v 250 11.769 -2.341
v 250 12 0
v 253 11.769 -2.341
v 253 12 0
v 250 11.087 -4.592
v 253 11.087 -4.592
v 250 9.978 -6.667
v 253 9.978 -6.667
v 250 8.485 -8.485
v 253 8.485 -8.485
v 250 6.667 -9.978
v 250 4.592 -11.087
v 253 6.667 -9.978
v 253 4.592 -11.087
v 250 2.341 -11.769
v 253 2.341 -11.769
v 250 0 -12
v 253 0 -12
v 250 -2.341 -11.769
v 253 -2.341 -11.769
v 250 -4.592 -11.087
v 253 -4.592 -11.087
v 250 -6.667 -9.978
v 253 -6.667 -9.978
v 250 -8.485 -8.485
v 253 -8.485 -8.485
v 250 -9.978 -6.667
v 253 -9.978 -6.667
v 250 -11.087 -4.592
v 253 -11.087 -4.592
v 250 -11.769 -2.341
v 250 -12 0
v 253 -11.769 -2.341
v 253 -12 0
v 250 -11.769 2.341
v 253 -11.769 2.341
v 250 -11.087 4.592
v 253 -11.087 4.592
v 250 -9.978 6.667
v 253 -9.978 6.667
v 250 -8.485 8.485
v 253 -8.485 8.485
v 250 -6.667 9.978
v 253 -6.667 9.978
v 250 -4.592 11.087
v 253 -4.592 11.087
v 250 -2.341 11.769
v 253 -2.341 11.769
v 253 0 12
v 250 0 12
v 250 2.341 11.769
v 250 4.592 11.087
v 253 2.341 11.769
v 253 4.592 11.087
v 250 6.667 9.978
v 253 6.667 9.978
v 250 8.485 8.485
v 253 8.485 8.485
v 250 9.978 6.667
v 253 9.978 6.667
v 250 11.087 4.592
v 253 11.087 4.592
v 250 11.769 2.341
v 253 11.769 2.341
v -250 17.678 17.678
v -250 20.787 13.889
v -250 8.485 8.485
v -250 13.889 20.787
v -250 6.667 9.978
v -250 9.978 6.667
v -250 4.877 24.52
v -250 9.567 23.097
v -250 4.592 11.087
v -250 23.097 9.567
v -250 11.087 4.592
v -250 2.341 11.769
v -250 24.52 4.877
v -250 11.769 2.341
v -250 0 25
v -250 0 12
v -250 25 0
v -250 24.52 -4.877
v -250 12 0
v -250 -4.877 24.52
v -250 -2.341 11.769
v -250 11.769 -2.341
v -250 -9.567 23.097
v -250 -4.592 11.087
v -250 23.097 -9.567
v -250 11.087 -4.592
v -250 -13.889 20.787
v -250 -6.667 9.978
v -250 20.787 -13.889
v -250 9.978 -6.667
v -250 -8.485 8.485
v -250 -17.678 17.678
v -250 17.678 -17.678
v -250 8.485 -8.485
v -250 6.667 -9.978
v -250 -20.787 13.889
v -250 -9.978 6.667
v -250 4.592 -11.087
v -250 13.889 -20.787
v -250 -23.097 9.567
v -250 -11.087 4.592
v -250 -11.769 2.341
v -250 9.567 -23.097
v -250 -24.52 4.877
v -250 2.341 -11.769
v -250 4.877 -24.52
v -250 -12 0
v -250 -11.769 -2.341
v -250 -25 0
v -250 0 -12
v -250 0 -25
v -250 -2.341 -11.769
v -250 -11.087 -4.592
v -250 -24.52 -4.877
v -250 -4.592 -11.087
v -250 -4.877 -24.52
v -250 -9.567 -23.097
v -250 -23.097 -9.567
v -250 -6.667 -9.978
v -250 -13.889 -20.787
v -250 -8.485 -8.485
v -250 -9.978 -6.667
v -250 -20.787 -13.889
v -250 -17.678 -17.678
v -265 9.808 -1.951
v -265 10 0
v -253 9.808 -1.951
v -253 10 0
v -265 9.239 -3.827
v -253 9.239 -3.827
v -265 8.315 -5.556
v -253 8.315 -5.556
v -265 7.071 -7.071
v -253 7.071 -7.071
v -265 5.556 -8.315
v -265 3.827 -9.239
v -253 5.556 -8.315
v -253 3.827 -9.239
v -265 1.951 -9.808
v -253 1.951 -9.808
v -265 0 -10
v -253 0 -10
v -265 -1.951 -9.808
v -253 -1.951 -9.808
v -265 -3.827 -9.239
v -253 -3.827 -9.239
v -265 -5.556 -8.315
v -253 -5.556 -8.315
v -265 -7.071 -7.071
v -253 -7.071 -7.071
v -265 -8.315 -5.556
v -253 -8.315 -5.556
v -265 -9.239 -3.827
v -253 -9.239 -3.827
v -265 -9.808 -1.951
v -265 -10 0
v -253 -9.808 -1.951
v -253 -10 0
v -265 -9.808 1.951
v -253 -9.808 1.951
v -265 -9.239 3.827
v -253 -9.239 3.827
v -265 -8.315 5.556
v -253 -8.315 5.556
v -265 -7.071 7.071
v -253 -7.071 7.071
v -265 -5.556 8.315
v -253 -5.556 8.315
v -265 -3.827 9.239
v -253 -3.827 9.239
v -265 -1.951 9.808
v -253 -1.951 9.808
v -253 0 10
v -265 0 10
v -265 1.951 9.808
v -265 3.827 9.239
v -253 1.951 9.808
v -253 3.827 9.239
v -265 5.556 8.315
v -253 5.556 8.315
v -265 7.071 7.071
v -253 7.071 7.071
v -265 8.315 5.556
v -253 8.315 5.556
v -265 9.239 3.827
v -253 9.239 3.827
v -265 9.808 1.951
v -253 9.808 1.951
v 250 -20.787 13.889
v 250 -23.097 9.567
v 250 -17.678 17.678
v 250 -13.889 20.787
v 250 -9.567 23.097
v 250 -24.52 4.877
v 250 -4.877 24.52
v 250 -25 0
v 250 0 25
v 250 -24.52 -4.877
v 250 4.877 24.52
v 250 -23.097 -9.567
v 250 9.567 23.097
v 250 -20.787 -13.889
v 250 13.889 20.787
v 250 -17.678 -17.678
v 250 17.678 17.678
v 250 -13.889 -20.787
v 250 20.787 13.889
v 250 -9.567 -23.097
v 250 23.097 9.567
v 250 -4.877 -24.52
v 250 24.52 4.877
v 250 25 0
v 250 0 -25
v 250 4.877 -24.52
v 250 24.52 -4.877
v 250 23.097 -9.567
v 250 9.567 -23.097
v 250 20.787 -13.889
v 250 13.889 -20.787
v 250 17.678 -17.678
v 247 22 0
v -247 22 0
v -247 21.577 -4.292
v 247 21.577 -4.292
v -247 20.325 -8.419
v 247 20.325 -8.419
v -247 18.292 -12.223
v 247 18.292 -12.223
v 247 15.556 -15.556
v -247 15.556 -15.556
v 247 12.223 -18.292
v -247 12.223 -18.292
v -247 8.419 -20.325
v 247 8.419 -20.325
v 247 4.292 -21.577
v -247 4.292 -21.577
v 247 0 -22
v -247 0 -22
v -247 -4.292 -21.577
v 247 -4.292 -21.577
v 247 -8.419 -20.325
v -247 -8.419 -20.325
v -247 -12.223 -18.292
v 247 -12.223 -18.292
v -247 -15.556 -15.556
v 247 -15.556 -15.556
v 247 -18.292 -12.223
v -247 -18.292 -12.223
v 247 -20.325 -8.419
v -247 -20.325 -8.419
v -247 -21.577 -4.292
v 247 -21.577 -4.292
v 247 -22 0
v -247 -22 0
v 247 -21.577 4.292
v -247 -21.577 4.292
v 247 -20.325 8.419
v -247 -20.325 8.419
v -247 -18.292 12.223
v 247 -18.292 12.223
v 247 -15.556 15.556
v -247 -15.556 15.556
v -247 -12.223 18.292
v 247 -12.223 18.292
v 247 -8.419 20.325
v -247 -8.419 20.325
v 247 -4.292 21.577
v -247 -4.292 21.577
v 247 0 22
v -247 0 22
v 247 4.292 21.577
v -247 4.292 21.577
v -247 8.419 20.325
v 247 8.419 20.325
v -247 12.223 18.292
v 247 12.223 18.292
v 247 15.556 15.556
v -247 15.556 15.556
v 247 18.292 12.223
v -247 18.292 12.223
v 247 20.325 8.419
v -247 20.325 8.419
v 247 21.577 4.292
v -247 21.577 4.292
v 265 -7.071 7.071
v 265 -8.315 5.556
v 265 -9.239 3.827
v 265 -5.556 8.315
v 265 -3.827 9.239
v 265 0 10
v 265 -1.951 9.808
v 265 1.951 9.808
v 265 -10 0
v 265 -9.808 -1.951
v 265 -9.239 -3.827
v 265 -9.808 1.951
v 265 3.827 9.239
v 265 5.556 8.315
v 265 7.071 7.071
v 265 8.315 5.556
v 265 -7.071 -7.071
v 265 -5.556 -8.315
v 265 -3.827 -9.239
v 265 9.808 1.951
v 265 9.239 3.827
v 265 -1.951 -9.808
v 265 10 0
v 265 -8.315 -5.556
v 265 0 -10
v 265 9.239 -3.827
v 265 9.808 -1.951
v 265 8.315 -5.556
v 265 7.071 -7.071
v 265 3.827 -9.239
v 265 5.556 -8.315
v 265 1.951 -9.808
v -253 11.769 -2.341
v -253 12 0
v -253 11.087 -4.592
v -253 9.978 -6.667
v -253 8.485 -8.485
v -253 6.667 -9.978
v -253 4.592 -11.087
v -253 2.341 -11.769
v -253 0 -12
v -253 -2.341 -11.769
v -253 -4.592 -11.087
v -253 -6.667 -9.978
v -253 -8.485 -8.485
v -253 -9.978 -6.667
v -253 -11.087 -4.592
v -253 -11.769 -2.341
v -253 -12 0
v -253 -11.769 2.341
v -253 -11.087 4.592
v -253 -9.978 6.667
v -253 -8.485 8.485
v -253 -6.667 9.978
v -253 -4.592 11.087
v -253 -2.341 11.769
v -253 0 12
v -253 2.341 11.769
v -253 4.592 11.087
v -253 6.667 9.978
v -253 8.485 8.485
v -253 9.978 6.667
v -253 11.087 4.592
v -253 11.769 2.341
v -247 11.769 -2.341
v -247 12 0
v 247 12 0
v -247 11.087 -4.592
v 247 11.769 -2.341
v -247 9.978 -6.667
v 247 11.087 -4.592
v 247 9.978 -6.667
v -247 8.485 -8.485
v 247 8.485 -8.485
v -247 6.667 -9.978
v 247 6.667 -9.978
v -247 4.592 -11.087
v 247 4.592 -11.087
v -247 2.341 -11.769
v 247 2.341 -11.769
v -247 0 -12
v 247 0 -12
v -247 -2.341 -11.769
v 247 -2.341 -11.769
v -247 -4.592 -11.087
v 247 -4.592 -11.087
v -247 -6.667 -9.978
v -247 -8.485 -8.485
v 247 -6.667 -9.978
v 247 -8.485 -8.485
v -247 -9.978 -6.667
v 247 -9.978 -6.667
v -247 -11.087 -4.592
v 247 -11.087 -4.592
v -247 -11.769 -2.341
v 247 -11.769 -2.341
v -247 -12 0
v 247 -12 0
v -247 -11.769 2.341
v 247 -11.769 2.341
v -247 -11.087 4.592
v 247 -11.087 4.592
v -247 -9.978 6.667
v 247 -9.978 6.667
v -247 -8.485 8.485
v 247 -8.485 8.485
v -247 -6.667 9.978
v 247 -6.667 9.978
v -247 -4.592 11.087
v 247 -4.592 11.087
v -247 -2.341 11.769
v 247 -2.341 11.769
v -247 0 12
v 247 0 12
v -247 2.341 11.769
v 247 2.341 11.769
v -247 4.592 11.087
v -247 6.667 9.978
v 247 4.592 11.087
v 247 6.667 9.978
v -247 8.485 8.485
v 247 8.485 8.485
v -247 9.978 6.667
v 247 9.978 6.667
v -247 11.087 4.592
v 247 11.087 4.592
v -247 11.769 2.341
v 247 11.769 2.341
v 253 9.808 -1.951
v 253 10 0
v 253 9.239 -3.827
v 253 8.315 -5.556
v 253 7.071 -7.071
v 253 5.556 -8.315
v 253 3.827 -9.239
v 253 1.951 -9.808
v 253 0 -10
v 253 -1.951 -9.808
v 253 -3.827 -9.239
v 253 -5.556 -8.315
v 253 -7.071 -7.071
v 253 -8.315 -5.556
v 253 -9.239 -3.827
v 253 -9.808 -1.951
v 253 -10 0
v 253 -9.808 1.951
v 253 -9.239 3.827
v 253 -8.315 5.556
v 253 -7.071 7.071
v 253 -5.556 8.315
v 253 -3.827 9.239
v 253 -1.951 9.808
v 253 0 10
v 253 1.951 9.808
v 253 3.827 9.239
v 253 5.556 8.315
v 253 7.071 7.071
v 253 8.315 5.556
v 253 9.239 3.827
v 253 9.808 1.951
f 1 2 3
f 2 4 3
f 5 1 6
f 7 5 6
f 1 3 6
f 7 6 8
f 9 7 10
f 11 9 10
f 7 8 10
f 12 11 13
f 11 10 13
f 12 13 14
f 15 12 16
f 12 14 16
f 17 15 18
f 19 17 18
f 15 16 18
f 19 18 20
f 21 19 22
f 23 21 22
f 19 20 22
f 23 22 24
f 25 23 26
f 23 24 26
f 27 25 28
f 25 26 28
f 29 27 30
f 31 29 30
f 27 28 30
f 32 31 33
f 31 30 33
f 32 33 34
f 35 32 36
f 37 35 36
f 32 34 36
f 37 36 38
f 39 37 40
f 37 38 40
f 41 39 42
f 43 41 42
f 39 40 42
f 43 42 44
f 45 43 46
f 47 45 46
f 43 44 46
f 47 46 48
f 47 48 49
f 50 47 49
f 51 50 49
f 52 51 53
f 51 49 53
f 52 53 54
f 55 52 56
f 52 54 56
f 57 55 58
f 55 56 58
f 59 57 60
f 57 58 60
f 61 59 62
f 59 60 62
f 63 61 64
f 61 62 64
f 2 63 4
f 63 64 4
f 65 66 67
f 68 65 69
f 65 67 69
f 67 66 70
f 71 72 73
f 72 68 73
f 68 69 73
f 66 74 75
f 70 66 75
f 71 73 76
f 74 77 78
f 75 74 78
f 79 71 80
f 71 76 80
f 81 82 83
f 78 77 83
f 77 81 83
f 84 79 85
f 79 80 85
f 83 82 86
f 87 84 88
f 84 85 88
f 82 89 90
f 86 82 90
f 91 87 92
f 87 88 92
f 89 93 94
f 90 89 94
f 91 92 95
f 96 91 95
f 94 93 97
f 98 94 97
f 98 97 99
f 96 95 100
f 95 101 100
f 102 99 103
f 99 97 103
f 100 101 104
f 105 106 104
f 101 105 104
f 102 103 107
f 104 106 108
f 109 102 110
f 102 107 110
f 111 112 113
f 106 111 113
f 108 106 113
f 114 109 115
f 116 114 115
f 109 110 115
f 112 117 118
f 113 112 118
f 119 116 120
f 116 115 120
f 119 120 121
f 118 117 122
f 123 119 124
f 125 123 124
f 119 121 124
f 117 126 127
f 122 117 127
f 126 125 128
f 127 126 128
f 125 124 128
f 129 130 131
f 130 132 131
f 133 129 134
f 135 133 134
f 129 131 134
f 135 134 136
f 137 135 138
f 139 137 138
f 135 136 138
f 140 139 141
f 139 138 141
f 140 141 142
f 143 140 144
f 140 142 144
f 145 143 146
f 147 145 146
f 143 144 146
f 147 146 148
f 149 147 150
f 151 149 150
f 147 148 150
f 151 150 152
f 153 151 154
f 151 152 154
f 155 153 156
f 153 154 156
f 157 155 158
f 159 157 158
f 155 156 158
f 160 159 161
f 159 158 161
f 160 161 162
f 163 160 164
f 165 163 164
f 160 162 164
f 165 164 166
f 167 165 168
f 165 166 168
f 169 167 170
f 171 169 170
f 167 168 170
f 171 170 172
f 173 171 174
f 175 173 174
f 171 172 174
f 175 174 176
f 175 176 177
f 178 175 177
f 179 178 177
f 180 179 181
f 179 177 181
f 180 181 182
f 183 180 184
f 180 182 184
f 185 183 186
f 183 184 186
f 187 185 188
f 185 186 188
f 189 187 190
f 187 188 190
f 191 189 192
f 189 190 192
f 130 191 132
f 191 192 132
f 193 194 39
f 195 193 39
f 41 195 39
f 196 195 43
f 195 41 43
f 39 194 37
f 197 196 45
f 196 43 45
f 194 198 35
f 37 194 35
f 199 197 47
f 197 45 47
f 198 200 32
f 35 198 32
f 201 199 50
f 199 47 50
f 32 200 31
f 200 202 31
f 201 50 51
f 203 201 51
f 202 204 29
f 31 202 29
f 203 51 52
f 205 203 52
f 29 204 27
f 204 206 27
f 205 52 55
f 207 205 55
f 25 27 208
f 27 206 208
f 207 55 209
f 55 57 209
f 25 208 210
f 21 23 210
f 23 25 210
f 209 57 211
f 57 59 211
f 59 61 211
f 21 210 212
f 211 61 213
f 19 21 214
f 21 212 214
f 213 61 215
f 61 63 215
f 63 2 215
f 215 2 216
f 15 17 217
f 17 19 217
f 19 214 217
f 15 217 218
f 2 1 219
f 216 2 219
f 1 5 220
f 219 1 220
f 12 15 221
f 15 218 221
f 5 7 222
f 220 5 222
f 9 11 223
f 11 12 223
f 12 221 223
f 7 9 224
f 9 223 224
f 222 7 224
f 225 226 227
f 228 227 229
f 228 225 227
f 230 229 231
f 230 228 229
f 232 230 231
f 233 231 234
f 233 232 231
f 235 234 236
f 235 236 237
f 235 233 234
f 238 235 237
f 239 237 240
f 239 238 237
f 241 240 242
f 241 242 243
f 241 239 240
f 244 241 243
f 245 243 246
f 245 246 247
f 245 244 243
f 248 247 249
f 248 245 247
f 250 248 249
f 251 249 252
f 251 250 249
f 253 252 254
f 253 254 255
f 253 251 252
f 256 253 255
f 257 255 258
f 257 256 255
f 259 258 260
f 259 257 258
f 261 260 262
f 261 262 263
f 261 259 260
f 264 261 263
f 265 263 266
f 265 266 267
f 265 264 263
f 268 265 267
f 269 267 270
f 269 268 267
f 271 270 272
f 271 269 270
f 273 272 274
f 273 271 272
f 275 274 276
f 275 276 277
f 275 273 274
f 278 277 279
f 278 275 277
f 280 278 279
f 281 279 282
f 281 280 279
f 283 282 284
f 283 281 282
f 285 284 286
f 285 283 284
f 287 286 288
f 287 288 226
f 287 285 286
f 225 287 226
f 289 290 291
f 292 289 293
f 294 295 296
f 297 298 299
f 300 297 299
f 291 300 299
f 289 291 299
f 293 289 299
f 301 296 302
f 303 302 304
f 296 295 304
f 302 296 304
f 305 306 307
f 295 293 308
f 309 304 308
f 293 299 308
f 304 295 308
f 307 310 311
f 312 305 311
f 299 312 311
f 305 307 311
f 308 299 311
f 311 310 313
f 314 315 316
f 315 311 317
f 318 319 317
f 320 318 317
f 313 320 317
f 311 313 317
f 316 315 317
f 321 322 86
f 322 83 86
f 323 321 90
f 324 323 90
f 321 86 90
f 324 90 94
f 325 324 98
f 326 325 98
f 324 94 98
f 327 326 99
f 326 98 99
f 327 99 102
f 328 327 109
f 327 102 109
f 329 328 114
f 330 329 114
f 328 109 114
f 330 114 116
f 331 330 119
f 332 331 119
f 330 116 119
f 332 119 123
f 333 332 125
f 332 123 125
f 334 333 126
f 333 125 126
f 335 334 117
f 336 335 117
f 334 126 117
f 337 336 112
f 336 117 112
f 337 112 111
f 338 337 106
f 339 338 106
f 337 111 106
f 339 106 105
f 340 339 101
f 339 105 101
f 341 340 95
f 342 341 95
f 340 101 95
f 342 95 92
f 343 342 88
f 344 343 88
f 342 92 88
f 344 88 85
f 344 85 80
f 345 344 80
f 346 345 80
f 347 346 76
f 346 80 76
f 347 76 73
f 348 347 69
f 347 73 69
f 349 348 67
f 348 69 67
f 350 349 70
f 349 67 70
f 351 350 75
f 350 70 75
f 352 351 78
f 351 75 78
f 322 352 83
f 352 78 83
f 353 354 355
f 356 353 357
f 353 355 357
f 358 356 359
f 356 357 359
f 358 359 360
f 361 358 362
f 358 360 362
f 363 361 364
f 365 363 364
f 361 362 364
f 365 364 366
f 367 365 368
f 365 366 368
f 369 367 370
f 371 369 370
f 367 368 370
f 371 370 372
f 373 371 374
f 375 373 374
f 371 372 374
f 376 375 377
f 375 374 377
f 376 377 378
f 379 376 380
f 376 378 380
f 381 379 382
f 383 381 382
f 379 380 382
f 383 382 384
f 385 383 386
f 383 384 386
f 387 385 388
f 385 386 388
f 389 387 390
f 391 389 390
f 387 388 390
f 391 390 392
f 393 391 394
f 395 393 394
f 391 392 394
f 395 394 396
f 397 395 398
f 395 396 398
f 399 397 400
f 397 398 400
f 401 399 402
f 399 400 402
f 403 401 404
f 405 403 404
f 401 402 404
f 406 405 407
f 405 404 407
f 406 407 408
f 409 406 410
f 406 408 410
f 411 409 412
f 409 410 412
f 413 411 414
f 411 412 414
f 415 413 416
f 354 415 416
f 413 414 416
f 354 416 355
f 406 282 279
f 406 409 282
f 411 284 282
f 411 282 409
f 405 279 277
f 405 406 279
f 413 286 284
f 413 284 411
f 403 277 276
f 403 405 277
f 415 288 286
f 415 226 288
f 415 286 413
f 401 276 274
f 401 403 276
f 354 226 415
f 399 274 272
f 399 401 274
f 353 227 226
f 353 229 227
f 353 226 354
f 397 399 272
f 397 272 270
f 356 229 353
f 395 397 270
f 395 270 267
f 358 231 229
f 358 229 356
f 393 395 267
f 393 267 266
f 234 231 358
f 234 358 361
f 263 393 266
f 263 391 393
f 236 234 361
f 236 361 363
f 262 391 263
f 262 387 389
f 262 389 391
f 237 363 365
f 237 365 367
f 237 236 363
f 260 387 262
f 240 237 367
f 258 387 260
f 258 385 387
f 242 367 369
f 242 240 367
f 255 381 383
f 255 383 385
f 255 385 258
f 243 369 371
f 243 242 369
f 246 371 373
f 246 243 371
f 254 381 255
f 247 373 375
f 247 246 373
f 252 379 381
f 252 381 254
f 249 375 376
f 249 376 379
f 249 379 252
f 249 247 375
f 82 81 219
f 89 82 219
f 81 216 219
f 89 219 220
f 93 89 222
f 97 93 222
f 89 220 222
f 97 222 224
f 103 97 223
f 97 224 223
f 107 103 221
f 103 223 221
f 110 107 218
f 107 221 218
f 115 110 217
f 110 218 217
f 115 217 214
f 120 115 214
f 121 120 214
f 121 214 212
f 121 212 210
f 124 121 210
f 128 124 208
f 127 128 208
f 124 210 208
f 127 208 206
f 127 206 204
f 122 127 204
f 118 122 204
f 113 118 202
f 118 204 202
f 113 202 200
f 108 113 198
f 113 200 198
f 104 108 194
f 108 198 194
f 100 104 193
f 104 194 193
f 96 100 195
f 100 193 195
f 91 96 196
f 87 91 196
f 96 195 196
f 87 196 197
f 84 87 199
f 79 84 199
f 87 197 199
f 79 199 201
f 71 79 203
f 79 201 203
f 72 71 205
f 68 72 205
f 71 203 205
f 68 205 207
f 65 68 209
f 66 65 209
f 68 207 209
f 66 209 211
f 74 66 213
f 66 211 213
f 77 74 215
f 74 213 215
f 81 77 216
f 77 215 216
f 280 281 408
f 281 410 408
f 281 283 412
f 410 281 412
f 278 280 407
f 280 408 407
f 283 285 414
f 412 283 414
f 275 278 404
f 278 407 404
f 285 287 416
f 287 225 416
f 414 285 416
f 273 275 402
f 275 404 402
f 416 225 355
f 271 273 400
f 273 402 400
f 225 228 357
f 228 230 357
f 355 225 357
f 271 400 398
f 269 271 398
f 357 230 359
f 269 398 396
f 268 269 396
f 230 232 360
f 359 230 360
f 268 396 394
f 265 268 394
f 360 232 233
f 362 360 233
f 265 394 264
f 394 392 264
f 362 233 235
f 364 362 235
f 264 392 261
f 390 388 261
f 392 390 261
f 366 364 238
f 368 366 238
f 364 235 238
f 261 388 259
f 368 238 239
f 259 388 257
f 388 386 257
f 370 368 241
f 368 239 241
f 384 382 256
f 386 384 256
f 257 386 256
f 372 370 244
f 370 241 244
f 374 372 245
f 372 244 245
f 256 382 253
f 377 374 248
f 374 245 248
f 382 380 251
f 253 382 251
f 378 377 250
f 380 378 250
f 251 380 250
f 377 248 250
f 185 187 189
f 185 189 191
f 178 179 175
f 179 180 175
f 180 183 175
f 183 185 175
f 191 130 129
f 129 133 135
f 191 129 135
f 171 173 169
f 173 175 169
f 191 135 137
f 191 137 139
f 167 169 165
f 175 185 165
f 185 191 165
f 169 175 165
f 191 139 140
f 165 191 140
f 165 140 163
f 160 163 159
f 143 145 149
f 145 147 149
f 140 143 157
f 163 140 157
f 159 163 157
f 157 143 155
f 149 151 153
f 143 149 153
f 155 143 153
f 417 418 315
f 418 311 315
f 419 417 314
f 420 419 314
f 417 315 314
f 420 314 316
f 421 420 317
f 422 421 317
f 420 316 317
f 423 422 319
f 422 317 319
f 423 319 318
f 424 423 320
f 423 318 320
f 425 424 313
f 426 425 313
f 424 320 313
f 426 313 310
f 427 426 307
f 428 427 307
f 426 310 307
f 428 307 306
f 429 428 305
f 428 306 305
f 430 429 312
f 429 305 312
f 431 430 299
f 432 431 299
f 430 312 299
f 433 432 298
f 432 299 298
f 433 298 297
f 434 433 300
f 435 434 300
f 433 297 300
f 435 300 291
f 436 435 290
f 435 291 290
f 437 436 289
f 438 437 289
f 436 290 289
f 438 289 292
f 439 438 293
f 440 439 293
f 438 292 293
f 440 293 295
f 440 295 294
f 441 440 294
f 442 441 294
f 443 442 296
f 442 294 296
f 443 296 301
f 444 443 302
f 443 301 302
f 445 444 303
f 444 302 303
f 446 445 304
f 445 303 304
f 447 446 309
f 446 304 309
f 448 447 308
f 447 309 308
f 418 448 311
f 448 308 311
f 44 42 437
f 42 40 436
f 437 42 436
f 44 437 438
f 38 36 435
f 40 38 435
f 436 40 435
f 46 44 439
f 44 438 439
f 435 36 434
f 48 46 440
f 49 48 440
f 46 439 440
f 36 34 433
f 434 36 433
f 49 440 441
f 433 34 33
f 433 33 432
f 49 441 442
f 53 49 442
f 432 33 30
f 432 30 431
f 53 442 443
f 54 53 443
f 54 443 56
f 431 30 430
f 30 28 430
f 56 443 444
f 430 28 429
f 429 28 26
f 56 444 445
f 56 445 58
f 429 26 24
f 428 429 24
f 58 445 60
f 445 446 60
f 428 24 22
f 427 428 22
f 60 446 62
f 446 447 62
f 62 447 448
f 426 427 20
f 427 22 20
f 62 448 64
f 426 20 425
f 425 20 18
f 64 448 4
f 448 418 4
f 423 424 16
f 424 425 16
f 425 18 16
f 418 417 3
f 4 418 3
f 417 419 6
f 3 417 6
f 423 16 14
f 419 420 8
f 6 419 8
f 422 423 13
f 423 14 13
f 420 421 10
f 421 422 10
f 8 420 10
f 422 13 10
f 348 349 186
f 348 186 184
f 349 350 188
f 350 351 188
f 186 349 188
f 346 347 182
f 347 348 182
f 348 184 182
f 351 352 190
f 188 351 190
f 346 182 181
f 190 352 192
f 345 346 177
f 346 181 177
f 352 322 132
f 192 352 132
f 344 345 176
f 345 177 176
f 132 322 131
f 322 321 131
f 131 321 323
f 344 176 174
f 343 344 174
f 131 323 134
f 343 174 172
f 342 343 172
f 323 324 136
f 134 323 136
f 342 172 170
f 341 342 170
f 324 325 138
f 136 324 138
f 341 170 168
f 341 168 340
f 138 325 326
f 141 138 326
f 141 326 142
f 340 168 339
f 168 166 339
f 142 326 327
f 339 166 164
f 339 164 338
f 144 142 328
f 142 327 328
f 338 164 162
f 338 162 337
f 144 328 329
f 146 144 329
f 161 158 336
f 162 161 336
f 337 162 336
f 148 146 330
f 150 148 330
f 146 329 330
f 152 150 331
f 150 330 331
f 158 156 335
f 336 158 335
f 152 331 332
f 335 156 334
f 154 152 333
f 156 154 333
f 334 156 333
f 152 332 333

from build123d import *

# Parameters (mm, degrees)
SKETCH_1_W = 494
SKETCH_1_H = 10


with BuildPart() as part:
    # 草图1 → 旋转1 (revolve)
    with BuildSketch(Plane.XY):
        Polygon((-265, 0), (-265, 10), (-253, 10), (-253, 12), (-250, 12), (-250, 25), (250, 25), (250, 12), (253, 12), (253, 10), (265, 10), (265, 0), align=None)
        with Locations((0, 17)):
            Rectangle(SKETCH_1_W, SKETCH_1_H, mode=Mode.SUBTRACT)
    revolve(axis=Axis((265, 0, 0), (-1, 0, 0)))


solid = part.part
